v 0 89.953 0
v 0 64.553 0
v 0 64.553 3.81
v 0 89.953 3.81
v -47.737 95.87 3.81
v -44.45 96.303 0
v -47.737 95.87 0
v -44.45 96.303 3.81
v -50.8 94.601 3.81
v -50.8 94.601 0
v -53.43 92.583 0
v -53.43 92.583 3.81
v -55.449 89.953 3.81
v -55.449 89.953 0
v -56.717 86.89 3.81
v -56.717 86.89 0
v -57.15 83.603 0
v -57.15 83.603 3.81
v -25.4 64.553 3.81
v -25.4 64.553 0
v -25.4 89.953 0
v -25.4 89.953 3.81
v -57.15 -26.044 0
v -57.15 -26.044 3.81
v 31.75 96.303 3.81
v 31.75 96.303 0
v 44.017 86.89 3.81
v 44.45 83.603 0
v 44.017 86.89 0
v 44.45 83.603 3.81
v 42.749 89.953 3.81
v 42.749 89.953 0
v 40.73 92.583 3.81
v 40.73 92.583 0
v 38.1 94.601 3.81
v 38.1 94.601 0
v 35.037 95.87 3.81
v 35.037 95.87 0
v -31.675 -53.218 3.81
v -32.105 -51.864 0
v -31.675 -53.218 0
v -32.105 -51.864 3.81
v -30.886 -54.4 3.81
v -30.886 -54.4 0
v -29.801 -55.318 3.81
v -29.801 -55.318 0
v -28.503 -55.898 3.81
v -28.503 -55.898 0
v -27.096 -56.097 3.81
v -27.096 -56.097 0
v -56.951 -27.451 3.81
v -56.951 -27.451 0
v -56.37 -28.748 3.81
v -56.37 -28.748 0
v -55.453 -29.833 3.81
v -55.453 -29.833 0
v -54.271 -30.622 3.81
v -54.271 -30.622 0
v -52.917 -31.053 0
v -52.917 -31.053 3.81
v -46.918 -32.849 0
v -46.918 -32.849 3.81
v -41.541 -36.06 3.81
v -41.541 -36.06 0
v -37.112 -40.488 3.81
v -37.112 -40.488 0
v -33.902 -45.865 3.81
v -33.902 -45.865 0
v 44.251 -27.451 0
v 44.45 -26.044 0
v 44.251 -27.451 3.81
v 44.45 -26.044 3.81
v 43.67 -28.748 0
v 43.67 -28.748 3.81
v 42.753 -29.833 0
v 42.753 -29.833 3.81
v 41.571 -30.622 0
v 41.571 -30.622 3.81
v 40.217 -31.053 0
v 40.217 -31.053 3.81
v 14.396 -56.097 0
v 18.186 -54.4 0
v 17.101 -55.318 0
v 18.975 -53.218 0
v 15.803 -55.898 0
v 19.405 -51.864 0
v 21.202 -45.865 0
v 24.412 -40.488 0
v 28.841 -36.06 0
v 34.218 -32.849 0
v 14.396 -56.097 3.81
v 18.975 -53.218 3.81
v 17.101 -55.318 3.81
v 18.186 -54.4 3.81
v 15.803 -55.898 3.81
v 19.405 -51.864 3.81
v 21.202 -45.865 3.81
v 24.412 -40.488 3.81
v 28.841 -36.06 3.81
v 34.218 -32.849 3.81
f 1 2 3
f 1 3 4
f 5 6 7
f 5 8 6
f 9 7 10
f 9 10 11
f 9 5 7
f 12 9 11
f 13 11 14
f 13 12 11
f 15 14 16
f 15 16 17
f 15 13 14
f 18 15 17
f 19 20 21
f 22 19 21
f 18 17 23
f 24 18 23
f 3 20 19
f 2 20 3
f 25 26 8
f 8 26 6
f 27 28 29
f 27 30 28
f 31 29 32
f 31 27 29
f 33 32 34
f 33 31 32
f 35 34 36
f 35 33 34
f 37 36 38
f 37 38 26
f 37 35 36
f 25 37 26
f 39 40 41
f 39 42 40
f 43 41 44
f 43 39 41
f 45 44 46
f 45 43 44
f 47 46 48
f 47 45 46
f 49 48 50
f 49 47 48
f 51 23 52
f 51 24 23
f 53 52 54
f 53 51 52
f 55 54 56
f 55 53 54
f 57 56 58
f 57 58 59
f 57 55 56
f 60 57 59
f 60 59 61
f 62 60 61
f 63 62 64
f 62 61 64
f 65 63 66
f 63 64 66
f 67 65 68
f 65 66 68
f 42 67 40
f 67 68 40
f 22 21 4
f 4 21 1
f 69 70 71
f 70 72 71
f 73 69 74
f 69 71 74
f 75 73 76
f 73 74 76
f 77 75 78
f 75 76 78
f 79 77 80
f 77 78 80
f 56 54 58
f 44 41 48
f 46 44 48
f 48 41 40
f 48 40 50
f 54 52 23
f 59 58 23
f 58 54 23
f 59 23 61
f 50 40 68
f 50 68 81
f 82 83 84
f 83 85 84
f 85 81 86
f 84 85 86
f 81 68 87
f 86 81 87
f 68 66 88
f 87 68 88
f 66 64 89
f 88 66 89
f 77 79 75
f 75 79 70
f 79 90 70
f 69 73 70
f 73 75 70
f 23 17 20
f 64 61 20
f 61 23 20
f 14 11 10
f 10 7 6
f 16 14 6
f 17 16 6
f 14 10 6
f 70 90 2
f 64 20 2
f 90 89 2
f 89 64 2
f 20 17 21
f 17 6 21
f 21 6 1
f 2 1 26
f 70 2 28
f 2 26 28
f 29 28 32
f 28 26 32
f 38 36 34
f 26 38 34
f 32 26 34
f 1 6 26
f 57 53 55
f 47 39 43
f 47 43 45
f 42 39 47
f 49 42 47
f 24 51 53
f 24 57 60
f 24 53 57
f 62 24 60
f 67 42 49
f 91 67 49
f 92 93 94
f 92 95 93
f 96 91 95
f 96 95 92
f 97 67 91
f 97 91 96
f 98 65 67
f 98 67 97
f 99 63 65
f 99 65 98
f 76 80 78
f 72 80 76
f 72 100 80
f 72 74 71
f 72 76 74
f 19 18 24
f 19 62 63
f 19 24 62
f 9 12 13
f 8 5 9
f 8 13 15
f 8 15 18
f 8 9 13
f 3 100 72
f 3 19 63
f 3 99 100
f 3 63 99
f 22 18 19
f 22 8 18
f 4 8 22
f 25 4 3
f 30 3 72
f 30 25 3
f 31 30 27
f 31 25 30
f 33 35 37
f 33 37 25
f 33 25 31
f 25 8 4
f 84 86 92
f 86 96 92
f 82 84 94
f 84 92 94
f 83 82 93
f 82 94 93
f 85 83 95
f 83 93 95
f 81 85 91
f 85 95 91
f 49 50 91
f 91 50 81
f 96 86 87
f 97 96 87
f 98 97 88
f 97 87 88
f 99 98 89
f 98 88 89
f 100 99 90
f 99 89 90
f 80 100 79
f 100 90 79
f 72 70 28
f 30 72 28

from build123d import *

# Parameters (mm, degrees)
F0_W     = 25.4
F0_H     = 25.4
F1_DEPTH = 3.81
F2_R     = 5.08
F3_R     = 5.08
F4_R     = 12.7


with BuildPart() as f1:
    # F0 (on Top) → F1 (new body)
    with BuildSketch(Plane.XY):
        with BuildLine():
            Line((-12.7, 96.302761), (-57.15, 96.302761))
            Line((-57.15, 96.302761), (-57.15, 89.952761))
            Line((-57.15, 89.952761), (-57.15, 83.602761))
            Line((-57.15, 83.602761), (-57.15, 70.902761))
            Line((-57.15, 70.902761), (-57.15, -30.697239))
            ThreePointArc((-57.15, -30.697239), (-39.189488, -38.136727), (-31.75, -56.097239))
            Line((-31.75, -56.097239), (19.05, -56.097239))
            ThreePointArc((19.05, -56.097239), (26.489488, -38.136727), (44.45, -30.697239))
            Line((44.45, -30.697239), (44.45, 96.302761))
            Line((44.45, 96.302761), (0, 96.302761))
            Line((0, 96.302761), (-12.7, 96.302761))
        make_face()
        with Locations((-12.7, 77.252761)):
            Rectangle(F0_W, F0_H, mode=Mode.SUBTRACT)
    extrude(amount=F1_DEPTH)

    # F2
    f2_edges = [f1.edges().sort_by_distance(p)[0] for p in [
        (-57.15, -30.697239, 1.905),
        (-31.75, -56.097239, 1.905),
    ]]
    fillet(f2_edges, radius=F2_R)

    # F3
    f3_edges = [f1.edges().sort_by_distance(p)[0] for p in [
        (44.45, -30.697239, 1.905),
        (19.05, -56.097239, 1.905),
    ]]
    fillet(f3_edges, radius=F3_R)

    # F4
    f4_edges = [f1.edges().sort_by_distance(p)[0] for p in [
        (-57.15, 96.302761, 1.905),
        (44.45, 96.302761, 1.905),
    ]]
    fillet(f4_edges, radius=F4_R)


solid = f1.part
